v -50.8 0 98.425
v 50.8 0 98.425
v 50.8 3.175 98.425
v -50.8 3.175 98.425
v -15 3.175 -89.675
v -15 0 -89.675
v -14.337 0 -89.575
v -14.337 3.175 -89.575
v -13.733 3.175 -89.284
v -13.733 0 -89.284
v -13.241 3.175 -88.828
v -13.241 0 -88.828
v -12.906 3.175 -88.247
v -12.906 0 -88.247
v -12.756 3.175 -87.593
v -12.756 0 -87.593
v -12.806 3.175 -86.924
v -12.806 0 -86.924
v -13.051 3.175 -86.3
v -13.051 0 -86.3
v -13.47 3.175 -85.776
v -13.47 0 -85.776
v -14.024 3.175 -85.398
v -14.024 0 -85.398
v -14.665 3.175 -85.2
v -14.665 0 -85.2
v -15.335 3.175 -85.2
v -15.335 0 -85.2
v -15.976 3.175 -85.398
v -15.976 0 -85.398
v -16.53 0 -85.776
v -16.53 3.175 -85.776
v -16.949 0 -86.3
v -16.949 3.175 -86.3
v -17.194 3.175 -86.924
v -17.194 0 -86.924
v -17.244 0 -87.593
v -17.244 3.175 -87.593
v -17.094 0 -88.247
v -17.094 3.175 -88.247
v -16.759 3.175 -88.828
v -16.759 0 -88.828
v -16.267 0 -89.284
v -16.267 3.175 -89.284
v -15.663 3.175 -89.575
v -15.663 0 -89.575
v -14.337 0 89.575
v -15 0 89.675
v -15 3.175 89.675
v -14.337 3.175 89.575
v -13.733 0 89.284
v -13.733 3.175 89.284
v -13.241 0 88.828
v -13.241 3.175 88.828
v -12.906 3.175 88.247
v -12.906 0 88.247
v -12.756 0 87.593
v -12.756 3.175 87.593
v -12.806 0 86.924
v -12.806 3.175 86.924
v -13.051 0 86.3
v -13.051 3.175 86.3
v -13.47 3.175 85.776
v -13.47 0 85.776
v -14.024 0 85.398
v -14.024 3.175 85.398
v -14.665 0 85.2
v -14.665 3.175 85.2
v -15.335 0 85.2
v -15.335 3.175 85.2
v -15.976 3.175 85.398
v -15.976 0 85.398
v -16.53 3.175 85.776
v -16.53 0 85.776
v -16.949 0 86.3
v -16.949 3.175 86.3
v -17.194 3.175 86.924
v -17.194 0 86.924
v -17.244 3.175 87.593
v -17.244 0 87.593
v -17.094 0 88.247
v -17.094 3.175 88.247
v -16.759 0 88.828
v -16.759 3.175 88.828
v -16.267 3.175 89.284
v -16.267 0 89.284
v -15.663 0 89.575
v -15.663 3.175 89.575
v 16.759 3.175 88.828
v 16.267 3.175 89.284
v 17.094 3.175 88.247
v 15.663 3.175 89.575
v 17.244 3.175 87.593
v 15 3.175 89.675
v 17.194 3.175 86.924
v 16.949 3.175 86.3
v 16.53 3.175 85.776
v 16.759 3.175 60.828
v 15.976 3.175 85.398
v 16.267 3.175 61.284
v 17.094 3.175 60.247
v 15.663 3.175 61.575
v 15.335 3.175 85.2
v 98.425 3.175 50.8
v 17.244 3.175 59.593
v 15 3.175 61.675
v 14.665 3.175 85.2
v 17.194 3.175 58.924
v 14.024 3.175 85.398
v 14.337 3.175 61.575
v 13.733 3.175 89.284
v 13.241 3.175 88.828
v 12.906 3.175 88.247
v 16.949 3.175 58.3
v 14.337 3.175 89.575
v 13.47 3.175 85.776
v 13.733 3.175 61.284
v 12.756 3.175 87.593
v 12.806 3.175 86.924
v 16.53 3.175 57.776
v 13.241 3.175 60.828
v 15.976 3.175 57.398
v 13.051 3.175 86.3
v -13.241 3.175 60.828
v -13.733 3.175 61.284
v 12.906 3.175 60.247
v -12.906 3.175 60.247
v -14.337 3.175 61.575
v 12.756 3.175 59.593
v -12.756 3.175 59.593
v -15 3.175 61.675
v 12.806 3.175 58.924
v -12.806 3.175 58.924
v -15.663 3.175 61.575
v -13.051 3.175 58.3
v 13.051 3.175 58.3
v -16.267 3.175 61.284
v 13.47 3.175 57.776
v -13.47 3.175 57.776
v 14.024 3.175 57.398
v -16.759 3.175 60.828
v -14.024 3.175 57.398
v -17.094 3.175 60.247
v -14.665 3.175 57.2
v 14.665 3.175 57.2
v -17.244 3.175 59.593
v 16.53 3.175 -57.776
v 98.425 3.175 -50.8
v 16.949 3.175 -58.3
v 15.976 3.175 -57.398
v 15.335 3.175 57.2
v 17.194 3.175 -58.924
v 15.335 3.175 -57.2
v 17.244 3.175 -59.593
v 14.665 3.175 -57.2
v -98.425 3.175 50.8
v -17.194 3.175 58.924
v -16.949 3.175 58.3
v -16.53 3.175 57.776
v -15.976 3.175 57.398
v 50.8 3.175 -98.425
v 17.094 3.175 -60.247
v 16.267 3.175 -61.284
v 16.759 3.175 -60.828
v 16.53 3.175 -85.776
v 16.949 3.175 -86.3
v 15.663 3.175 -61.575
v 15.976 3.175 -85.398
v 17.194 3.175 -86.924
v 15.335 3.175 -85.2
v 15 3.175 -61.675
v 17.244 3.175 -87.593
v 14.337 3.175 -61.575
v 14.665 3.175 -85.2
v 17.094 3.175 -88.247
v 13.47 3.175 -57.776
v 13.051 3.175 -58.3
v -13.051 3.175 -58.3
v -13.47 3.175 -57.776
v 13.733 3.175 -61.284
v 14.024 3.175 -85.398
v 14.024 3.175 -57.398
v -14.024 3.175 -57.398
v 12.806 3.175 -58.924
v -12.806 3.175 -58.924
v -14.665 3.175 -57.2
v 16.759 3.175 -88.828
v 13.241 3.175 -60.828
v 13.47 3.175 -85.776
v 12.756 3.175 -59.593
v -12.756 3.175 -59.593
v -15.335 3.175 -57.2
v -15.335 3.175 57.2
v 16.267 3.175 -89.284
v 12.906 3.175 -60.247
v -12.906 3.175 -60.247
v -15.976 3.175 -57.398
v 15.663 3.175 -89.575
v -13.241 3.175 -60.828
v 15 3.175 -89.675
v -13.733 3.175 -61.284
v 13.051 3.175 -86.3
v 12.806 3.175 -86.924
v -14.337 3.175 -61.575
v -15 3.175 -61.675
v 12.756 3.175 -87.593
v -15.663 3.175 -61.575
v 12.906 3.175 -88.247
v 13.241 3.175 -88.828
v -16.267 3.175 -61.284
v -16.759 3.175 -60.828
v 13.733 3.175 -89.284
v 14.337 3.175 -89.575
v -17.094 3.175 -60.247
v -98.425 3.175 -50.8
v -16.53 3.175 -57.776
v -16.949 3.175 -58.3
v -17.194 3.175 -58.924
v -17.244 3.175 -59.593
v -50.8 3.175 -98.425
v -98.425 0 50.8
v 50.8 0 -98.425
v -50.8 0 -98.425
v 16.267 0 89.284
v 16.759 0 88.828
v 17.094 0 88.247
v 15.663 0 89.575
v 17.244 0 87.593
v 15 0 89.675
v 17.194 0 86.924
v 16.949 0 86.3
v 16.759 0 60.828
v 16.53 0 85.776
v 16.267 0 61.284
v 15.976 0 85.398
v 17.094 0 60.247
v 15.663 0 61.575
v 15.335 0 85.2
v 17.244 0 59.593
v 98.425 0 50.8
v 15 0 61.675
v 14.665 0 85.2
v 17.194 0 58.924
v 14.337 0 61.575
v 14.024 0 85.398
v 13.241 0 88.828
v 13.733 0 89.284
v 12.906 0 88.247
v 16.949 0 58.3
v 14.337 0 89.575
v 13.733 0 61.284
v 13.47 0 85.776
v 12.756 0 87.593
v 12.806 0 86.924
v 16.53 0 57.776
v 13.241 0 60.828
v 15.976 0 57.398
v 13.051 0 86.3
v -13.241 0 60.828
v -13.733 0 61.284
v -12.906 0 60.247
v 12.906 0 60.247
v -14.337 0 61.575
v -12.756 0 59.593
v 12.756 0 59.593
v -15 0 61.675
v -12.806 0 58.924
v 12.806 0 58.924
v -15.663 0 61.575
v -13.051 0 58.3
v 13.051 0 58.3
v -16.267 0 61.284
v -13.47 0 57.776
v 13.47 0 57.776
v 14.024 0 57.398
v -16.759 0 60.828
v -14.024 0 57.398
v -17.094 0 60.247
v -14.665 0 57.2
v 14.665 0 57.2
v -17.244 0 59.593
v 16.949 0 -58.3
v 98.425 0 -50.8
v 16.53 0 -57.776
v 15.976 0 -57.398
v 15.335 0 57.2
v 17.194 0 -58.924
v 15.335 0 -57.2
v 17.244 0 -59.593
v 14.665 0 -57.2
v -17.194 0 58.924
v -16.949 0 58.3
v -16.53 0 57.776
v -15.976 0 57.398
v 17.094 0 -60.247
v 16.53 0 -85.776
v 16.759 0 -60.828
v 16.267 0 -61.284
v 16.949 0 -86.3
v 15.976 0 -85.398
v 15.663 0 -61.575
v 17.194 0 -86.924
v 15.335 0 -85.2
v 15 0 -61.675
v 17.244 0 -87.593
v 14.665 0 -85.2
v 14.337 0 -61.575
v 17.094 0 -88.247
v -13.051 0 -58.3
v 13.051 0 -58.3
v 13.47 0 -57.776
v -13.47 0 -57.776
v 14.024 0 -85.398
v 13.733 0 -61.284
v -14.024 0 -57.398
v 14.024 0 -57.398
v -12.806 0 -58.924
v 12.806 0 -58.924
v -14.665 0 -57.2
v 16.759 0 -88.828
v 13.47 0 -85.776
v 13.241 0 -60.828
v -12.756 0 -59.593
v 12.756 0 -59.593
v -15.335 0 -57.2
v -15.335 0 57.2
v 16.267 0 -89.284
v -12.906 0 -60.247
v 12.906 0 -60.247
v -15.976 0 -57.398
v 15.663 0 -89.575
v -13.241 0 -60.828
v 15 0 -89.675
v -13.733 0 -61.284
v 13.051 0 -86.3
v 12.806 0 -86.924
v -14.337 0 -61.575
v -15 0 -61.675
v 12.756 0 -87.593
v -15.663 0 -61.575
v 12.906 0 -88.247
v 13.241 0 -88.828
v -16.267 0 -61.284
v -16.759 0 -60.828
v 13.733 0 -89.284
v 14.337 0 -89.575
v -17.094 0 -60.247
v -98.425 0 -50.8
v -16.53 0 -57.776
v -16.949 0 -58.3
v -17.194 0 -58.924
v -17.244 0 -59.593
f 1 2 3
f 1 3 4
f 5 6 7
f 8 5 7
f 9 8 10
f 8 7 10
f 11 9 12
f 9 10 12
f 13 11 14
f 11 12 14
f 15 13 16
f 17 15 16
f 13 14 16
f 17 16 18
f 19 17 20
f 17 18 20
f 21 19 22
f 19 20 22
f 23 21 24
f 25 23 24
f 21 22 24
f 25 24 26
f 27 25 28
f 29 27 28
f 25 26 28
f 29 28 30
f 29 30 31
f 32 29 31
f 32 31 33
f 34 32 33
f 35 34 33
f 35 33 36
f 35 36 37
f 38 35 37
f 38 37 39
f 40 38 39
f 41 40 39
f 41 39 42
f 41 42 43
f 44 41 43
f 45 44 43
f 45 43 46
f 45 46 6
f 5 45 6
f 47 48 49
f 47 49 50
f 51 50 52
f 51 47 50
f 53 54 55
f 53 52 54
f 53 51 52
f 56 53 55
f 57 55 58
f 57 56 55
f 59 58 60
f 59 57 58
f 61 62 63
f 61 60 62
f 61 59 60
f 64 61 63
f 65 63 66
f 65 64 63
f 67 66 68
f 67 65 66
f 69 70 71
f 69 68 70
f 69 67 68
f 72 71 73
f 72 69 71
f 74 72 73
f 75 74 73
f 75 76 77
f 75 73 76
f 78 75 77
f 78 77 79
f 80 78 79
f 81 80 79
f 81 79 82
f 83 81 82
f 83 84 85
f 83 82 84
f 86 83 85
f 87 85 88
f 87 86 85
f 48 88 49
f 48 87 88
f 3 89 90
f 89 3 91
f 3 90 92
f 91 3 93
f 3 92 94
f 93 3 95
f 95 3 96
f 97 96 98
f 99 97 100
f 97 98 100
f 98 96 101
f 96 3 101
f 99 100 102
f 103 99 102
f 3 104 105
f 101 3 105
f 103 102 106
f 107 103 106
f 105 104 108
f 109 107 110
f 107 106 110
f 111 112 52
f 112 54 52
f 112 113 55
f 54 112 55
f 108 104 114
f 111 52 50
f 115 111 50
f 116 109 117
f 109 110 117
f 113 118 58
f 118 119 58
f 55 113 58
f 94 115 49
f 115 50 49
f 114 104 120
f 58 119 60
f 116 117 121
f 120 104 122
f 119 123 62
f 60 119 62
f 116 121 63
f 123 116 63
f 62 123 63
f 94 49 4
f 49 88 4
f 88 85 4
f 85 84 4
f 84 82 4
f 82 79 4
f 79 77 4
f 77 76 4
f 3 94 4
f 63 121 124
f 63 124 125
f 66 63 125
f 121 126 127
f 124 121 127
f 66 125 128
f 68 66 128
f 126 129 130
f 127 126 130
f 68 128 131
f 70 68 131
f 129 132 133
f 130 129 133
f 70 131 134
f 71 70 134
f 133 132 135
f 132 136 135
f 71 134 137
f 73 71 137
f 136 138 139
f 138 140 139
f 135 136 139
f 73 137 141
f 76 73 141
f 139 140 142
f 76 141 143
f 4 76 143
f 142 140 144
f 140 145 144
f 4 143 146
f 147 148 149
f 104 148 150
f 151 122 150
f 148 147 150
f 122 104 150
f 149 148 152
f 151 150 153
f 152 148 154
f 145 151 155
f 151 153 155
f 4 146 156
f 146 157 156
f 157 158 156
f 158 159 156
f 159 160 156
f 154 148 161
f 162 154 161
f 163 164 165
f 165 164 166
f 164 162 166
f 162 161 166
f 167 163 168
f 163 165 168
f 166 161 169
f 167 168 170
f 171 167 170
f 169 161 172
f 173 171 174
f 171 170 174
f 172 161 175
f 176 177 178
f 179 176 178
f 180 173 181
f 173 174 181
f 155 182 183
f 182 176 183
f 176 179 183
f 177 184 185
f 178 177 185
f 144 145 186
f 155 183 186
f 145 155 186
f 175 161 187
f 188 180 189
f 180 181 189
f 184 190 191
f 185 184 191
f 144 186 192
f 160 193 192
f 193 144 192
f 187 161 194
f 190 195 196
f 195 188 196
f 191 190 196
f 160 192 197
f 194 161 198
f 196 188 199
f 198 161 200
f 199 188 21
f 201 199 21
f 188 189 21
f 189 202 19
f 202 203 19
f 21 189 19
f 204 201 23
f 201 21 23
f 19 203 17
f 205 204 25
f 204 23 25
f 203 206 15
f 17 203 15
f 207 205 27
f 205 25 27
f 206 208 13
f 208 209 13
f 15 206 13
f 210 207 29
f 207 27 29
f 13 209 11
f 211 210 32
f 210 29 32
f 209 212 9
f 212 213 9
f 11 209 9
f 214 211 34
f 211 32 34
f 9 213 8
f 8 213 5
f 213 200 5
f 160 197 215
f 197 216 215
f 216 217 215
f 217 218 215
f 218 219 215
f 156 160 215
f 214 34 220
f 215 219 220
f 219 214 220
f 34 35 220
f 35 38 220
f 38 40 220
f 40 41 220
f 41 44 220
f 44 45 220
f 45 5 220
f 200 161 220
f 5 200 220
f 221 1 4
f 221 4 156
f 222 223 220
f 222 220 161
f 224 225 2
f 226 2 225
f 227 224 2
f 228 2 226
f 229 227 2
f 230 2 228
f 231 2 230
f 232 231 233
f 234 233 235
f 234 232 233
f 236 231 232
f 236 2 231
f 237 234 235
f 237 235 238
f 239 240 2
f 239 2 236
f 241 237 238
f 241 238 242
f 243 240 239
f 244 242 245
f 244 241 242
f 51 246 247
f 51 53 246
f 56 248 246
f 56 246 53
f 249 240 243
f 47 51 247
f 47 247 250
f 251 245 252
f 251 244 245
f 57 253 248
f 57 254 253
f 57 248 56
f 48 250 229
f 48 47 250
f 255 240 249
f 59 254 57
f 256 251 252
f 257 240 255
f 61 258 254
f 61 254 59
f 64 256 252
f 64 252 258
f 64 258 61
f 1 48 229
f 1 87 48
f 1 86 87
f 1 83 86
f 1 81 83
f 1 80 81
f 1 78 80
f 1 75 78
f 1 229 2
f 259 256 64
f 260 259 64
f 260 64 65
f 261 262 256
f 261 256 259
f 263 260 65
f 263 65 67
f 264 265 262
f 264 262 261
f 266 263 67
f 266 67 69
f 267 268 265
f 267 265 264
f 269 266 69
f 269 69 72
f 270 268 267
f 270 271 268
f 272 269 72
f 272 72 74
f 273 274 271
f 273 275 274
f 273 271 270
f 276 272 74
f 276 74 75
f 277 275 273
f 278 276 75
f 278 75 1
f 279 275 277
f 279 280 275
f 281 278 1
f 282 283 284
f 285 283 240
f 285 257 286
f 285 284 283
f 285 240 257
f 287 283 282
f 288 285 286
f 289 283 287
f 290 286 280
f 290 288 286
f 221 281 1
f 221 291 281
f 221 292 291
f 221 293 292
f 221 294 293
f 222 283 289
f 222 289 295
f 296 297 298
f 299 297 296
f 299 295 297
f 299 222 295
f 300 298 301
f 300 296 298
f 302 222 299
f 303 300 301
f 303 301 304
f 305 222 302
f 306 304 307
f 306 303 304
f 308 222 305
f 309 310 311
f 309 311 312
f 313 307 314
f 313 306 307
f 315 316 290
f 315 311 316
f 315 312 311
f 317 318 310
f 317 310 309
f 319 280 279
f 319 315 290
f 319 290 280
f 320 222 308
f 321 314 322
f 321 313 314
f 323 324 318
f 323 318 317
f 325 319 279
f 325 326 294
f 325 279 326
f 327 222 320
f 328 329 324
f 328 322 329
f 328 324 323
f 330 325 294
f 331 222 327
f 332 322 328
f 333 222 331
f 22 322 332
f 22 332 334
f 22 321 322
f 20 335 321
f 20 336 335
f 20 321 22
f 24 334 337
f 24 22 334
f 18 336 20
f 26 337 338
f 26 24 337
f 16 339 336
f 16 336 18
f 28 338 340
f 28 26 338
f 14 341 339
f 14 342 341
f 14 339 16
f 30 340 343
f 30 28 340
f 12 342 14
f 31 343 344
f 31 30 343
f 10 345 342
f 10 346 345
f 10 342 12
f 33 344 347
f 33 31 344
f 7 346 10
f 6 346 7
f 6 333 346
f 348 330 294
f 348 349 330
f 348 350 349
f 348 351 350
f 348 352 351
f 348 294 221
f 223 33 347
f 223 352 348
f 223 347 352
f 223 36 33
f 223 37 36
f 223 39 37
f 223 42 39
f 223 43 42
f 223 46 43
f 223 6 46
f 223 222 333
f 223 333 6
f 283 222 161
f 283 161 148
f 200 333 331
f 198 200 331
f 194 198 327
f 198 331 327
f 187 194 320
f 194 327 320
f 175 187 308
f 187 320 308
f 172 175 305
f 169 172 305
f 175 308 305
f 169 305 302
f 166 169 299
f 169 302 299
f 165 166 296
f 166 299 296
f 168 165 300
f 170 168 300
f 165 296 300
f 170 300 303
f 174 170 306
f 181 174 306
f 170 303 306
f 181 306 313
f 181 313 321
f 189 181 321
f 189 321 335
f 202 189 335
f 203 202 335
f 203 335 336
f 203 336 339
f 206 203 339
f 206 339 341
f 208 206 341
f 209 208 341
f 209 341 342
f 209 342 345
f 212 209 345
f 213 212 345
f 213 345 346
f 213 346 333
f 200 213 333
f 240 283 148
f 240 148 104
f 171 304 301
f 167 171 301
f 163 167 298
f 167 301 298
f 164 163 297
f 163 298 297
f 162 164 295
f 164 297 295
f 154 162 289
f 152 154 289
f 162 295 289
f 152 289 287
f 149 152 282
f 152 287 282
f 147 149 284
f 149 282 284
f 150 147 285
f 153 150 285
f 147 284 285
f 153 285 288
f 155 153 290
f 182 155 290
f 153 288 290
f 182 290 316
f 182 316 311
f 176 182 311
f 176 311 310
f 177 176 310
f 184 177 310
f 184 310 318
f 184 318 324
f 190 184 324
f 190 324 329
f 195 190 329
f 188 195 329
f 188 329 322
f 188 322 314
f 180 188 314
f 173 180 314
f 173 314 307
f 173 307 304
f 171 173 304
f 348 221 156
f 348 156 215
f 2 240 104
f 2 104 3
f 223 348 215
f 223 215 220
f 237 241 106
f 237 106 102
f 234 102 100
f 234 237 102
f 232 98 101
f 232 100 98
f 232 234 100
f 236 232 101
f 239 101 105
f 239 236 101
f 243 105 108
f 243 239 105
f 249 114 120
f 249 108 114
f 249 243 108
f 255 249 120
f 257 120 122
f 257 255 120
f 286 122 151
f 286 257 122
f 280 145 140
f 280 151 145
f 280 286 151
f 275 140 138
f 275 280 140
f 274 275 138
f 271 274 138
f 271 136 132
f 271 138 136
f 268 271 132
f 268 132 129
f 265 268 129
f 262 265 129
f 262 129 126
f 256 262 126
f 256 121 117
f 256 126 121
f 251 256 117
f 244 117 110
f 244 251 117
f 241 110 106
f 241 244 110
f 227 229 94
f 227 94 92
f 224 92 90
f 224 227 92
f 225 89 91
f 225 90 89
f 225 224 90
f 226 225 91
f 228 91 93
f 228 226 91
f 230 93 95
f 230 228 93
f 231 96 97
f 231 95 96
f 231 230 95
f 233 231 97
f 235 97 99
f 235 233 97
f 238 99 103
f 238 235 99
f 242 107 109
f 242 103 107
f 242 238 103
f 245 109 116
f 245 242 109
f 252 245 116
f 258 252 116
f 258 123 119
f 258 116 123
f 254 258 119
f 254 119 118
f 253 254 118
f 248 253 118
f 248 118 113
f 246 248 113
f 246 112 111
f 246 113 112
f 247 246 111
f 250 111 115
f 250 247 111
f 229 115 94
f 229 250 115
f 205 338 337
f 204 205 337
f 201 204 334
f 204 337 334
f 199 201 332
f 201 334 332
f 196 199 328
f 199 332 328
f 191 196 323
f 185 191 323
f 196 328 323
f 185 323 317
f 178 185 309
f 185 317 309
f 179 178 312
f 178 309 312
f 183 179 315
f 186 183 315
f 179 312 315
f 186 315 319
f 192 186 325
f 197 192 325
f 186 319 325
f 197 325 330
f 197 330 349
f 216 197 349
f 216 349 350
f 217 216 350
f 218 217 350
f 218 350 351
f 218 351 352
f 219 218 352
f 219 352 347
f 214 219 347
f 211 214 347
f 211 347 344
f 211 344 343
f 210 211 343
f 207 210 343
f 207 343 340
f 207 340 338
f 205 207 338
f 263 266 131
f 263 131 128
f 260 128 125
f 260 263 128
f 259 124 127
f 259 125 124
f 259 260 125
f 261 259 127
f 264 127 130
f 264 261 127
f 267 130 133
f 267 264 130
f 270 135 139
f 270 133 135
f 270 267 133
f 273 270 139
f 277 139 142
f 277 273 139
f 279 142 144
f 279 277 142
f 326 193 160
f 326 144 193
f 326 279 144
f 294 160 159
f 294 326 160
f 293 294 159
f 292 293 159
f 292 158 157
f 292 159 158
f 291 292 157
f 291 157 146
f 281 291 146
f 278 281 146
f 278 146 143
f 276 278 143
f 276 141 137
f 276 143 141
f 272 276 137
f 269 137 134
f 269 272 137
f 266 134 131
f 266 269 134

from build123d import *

# Parameters (mm, degrees)
BOSS_EXTRUDE1_DEPTH  = 3.175
M4_CLEARANCE_HOLE1_D = 4.5


with BuildPart() as part:
    # Sketch1 → Boss-Extrude1 (new body)
    with BuildSketch(Plane(origin=(0, 0, 0), x_dir=(1, 0, 0), z_dir=(0, 1, 0))):
        Polygon((-98.425, 50.8), (-50.8, 98.425), (50.8, 98.425), (98.425, 50.8), (98.425, -50.8), (50.8, -98.425), (-50.8, -98.425), (-98.425, -50.8), align=None)
    extrude(amount=BOSS_EXTRUDE1_DEPTH)

    # M4 Clearance Hole1 (through all)
    with Locations(Plane(origin=(-15, 3.175, -87.425), x_dir=(0, 0, 1), z_dir=(0, 1, 0))):
        with Locations((0, 0), (28, 0), (28, 30), (0, 30)):
            m4_clearance_hole1 = Hole(M4_CLEARANCE_HOLE1_D / 2)

    # Mirror1: M4 Clearance Hole1 across plane
    add(m4_clearance_hole1.mirror(Plane.XY), mode=Mode.SUBTRACT)


solid = part.part
